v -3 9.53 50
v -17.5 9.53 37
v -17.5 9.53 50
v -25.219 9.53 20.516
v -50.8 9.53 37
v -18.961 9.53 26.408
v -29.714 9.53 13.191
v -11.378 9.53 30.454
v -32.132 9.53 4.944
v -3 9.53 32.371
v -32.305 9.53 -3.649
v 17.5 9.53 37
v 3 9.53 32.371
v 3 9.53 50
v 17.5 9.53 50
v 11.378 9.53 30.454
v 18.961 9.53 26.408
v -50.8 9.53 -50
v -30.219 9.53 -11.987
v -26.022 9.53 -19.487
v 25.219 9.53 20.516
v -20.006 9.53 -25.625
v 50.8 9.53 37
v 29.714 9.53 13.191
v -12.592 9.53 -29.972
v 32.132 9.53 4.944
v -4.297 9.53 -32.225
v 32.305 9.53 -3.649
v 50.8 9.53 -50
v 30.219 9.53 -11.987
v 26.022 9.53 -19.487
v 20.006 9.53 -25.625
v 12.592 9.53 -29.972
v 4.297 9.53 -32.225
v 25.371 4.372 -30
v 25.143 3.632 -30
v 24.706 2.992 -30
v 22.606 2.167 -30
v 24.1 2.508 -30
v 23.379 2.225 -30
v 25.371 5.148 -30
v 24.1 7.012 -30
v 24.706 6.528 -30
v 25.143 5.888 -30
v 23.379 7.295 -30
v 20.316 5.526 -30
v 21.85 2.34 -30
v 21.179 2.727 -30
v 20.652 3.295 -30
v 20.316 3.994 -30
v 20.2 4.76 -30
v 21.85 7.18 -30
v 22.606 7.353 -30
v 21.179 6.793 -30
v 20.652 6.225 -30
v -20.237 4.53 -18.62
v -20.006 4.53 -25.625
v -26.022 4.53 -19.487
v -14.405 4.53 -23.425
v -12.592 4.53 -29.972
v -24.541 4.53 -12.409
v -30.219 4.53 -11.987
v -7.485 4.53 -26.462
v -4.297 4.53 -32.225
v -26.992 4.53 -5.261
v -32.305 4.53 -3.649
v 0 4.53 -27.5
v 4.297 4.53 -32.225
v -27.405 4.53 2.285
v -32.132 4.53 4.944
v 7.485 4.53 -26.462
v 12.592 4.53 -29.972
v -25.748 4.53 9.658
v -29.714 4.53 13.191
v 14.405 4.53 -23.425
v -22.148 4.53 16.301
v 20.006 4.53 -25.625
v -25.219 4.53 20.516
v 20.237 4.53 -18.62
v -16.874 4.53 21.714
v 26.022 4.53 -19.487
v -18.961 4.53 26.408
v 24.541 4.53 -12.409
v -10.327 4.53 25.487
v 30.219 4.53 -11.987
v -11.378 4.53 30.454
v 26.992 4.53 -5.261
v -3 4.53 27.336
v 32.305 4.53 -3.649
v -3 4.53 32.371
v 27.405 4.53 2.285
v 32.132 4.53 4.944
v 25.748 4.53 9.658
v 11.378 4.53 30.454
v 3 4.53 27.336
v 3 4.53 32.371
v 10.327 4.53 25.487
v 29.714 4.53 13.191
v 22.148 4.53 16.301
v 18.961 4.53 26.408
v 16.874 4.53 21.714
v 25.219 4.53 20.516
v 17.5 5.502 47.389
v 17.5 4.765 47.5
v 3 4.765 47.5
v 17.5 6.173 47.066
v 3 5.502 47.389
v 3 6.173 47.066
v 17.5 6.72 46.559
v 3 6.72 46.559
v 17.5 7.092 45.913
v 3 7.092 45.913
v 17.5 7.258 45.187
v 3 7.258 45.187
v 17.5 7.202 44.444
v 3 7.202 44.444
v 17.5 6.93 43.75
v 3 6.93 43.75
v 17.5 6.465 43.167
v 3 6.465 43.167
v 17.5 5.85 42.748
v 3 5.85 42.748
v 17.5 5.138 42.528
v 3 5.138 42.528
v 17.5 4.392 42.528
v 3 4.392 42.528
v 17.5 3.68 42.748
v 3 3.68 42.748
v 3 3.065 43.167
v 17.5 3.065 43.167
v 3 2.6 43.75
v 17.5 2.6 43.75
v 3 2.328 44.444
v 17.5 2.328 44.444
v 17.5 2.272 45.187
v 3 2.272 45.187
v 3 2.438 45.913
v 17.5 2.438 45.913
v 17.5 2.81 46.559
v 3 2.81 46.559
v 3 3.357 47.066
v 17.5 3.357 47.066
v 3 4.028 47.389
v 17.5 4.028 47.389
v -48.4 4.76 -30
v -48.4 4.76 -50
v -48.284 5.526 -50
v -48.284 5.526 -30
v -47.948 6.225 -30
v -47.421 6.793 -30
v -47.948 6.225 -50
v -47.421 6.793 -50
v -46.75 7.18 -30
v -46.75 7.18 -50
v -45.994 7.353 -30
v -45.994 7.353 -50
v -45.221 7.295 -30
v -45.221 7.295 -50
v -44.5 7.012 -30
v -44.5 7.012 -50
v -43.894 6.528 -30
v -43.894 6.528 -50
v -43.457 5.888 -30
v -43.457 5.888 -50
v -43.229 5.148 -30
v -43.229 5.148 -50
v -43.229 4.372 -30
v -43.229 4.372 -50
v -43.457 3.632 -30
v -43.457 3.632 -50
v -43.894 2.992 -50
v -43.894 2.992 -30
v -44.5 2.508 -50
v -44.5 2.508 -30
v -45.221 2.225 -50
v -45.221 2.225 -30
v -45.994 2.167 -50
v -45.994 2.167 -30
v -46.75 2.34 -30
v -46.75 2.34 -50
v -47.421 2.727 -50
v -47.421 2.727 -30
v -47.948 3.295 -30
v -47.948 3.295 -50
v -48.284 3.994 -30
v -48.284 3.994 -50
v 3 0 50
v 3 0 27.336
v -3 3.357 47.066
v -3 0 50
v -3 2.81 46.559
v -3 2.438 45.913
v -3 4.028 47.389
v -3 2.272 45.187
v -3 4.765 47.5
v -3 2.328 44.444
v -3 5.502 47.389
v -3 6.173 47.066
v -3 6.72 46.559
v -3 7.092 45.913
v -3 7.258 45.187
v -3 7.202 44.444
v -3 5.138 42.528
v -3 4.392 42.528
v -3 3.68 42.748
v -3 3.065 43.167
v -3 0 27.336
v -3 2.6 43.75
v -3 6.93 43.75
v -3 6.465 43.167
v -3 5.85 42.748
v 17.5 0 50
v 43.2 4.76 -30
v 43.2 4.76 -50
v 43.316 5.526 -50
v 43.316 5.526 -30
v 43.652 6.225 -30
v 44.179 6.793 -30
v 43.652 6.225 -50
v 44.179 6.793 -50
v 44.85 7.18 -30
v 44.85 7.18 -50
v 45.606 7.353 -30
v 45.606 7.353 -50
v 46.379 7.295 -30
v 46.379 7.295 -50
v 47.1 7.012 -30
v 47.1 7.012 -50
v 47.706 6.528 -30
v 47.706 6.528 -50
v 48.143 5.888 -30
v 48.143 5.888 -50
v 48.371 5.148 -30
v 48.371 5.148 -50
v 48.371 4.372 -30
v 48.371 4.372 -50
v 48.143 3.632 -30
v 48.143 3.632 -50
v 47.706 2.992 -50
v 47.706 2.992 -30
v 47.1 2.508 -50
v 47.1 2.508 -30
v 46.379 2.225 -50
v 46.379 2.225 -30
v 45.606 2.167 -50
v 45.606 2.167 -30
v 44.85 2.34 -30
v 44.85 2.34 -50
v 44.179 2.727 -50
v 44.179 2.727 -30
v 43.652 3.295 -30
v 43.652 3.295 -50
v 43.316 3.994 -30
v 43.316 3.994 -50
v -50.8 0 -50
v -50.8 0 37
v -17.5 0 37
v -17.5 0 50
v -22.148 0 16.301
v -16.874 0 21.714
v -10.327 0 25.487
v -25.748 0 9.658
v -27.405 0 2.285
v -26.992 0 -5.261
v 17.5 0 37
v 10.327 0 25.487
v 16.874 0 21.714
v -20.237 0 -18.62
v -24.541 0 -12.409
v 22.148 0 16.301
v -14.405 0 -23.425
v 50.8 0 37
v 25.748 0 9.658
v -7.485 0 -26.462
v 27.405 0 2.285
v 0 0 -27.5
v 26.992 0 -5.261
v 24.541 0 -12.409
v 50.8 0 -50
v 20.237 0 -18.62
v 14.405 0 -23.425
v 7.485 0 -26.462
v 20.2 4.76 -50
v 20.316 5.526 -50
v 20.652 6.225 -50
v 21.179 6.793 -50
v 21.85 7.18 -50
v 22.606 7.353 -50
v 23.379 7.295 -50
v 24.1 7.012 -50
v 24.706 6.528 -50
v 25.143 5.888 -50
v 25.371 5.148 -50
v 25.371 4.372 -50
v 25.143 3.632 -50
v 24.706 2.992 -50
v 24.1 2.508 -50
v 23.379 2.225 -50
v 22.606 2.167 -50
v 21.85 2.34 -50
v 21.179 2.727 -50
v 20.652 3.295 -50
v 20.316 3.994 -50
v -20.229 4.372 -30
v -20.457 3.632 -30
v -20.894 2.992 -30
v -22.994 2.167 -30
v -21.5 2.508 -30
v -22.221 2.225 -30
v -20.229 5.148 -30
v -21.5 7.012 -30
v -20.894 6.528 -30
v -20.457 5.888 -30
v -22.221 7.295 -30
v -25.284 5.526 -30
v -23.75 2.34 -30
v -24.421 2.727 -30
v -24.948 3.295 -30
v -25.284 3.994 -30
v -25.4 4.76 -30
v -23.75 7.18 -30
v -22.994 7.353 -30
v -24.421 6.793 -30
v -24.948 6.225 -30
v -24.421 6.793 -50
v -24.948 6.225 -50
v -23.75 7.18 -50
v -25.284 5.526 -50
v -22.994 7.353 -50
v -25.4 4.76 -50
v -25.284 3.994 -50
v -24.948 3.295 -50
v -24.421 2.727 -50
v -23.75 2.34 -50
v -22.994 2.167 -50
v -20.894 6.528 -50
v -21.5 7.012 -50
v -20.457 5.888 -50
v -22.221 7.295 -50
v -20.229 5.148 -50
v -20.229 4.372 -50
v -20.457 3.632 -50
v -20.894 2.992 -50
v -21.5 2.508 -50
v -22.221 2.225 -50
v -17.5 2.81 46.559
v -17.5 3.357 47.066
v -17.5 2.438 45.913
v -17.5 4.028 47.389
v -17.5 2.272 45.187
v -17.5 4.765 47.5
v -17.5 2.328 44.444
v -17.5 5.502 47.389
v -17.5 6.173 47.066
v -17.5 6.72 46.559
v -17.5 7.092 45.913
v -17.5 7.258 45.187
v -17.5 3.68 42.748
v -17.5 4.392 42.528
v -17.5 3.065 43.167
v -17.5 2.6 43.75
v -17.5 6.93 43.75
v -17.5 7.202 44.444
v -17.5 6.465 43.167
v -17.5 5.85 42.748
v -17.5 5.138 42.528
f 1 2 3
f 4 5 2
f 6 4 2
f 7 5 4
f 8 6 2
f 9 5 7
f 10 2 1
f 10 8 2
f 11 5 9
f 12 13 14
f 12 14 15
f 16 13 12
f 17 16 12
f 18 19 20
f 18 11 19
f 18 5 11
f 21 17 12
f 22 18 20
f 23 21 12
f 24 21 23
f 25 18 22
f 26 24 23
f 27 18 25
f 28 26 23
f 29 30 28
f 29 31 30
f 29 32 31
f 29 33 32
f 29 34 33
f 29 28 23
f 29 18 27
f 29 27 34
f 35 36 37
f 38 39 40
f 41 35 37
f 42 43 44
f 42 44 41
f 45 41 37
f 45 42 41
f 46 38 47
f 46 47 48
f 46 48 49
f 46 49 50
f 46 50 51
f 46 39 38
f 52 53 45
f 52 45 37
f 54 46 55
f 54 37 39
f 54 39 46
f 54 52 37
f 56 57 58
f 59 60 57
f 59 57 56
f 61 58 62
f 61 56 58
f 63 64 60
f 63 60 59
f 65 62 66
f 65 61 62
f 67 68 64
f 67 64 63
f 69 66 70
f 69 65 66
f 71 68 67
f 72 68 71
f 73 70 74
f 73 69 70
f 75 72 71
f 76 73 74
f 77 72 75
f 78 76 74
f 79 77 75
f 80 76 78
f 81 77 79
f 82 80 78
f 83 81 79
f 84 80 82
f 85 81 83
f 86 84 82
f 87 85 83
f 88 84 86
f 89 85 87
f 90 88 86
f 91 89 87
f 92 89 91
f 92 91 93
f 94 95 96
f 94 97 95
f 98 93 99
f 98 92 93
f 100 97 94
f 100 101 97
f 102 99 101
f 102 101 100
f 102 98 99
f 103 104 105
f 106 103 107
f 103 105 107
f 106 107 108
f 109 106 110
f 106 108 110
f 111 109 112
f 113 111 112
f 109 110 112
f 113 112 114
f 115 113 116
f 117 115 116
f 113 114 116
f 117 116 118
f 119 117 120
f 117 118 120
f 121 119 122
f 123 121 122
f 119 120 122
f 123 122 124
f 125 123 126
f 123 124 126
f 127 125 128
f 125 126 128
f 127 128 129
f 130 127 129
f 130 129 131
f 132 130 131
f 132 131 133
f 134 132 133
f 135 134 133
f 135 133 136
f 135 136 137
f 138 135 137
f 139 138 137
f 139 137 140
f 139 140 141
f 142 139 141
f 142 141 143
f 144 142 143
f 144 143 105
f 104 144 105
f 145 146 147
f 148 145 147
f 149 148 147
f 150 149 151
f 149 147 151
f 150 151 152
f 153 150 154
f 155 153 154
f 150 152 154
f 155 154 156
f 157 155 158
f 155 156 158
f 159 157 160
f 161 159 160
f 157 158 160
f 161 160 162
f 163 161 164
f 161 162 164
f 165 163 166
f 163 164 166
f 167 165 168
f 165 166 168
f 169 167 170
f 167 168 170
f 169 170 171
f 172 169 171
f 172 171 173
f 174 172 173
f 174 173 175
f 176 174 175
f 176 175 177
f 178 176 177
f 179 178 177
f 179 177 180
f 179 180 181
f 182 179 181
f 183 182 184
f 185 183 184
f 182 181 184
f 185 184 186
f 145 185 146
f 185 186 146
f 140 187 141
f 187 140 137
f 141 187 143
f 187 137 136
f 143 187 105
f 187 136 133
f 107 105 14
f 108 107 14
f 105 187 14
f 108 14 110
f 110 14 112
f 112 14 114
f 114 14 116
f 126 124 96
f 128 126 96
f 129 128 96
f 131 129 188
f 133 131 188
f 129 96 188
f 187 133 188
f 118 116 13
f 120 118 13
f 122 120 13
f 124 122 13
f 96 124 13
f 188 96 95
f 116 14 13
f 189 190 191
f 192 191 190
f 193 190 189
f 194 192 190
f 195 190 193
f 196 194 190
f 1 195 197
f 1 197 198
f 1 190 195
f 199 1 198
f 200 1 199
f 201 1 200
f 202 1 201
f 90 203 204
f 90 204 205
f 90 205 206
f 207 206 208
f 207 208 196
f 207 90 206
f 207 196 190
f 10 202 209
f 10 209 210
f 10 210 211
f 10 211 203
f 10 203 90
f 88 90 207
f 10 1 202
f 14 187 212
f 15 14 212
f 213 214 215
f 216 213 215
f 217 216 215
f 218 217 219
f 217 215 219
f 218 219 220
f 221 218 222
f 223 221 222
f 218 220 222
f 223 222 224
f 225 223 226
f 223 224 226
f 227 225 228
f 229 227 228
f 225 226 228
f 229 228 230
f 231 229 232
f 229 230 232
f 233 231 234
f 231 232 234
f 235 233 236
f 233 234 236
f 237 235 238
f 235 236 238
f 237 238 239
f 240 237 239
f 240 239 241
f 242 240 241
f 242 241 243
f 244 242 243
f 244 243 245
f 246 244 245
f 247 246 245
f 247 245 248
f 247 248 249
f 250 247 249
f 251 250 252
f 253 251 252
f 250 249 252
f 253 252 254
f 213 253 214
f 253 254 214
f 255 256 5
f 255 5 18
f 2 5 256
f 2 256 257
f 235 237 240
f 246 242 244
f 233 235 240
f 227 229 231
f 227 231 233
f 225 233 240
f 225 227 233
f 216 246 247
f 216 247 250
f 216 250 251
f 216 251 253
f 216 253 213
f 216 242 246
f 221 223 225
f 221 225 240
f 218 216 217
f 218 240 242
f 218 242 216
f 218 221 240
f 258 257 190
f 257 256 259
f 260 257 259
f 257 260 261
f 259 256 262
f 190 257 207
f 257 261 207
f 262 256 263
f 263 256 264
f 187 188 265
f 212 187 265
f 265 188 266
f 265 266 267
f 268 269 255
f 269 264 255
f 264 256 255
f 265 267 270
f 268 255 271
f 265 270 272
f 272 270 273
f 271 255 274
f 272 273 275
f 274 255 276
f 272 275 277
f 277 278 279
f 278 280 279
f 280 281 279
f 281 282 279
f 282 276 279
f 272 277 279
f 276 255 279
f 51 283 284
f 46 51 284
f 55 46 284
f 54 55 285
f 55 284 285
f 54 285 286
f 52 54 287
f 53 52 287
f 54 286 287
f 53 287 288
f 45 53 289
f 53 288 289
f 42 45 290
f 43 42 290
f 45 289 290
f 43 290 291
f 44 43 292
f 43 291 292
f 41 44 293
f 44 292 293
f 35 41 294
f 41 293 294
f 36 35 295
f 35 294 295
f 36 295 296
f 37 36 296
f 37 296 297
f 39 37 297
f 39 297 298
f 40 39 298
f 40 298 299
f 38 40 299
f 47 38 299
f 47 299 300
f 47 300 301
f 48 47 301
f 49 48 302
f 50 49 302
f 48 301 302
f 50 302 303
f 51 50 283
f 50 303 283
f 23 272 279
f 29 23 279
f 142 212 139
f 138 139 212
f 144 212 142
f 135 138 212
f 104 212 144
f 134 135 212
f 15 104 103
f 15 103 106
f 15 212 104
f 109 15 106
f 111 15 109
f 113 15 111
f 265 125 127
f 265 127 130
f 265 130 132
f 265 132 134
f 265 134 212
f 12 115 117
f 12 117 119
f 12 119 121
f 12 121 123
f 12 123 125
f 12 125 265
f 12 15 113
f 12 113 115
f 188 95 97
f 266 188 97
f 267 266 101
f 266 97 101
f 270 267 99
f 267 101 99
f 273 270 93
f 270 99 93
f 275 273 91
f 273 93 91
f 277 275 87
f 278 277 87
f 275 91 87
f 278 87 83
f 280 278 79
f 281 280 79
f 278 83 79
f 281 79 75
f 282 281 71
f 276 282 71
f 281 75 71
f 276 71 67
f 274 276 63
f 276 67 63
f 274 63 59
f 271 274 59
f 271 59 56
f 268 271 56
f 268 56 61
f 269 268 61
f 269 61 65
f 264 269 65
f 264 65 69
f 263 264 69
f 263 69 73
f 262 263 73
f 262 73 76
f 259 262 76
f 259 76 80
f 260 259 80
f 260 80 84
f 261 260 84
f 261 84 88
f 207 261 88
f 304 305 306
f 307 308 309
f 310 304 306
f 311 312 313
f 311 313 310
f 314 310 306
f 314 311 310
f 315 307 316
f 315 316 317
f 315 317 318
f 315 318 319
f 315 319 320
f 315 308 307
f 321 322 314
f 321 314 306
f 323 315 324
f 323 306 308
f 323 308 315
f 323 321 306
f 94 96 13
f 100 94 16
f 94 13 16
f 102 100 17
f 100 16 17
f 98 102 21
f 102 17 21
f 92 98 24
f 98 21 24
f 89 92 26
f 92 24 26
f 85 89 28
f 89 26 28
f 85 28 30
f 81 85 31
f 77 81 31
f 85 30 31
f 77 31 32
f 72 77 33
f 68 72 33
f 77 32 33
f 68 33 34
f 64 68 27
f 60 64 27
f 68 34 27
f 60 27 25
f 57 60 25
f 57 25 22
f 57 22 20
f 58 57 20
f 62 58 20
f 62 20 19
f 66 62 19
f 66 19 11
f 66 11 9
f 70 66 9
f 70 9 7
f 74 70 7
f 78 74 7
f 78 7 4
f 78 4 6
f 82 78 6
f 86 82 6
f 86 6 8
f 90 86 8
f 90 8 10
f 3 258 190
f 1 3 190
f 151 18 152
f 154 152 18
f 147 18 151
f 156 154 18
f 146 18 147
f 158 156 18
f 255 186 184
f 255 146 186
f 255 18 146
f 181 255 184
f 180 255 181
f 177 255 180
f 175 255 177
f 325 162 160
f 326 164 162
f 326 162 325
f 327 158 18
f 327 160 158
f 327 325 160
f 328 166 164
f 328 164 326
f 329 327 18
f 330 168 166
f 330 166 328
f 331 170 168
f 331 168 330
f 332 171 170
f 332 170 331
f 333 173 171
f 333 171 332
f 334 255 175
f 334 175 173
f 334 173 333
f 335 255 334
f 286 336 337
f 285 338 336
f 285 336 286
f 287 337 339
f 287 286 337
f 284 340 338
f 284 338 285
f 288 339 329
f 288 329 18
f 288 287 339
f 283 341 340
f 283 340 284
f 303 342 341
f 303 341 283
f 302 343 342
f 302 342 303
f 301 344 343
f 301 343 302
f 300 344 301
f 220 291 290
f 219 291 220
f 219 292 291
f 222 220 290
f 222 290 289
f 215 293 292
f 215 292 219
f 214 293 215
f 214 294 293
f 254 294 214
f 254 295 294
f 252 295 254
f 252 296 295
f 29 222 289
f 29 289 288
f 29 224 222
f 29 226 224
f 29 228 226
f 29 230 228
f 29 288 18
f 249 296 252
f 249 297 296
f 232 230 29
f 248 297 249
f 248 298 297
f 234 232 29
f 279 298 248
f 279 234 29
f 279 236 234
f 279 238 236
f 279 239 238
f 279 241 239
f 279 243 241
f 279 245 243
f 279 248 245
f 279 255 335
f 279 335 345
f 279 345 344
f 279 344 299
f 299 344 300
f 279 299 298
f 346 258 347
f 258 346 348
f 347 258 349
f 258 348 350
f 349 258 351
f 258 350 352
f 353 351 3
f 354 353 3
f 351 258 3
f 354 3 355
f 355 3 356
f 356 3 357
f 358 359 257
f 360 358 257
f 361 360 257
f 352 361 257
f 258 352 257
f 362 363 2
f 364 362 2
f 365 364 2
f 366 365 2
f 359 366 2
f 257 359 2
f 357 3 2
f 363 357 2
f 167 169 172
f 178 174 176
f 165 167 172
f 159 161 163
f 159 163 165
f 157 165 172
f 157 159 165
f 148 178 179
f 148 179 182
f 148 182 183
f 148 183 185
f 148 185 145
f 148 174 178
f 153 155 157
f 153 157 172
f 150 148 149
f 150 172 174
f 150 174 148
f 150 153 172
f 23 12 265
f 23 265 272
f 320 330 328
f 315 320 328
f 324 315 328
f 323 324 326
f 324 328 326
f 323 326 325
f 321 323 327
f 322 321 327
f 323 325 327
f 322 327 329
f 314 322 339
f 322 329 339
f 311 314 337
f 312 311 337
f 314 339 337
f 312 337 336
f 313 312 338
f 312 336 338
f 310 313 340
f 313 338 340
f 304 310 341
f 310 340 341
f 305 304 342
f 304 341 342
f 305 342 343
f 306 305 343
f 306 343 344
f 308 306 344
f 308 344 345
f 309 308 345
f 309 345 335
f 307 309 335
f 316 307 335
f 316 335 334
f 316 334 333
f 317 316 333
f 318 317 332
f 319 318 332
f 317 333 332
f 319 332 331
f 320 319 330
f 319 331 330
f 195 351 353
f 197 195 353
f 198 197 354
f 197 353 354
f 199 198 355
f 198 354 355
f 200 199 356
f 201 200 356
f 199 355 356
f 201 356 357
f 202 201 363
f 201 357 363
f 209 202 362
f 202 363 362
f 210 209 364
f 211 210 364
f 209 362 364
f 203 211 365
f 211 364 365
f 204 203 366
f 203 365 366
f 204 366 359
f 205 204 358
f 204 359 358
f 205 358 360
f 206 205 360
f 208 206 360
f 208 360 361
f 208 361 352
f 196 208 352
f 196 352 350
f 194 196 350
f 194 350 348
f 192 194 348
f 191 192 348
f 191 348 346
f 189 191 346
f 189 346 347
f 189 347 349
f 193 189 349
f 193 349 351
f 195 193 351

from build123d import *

# Parameters (mm, degrees)
ESBO_O1_W                = 101.6
ESBO_O1_H                = 100
RESSALTO_EXTRUS_O1_DEPTH = 9.53
ESBO_O2_R                = 2.6
CORTE_EXTRUS_O1_DEPTH    = 20
ESBO_O3_R                = 32.51
CORTE_EXTRUS_O2_DEPTH    = 5
CORTE_EXTRUS_O3_REACH    = 73.454
ESBO_O4_R                = 27.5
CORTE_EXTRUS_O4_REACH    = 73.913
ESBO_O5_W                = 33.3
ESBO_O5_H                = 13
CORTE_EXTRUS_O5_REACH    = 73.913
ESBO_O6_W                = 6
ESBO_O6_H                = 29.667415493
CORTE_EXTRUS_O6_REACH    = 87.18
ESBO_O7_R                = 2.5


with BuildPart() as part:
    # Esboço1 → Ressalto-extrusão1 (new body)
    with BuildSketch(Plane(origin=(0, 0, 0), x_dir=(1, 0, 0), z_dir=(0, 1, 0))):
        Rectangle(ESBO_O1_W, ESBO_O1_H)
    extrude(amount=RESSALTO_EXTRUS_O1_DEPTH)

    # Esboço2 → Corte-extrusão1 (cut)
    with BuildSketch(Plane(origin=(0, 0, -50), x_dir=(-1, 0, 0), z_dir=(0, 0, -1))):
        with Locations((-45.8, 4.76)):
            Circle(ESBO_O2_R)
        with Locations((-22.8, 4.76)):
            Circle(ESBO_O2_R)
        with Locations((22.8, 4.76)):
            Circle(ESBO_O2_R)
        with Locations((45.8, 4.76)):
            Circle(ESBO_O2_R)
    extrude(amount=-CORTE_EXTRUS_O1_DEPTH, mode=Mode.SUBTRACT)

    # Esboço3 → Corte-extrusão2 (cut)
    with BuildSketch(Plane(origin=(0, 9.53, 0), x_dir=(1, 0, 0), z_dir=(0, 1, 0))):
        with Locations(Location((0, 0, 0), (0, 0, 270))):
            Circle(ESBO_O3_R)
    extrude(amount=-CORTE_EXTRUS_O2_DEPTH, mode=Mode.SUBTRACT)

    # Esboço4 → Corte-extrusão3 (cut, up to next)
    with BuildSketch(Plane(origin=(0, 4.53, 0), x_dir=(1, 0, 0), z_dir=(0, 1, 0)), mode=Mode.PRIVATE) as corte_extrus_o3_sk1:
        with Locations(Location((0, 0, 0), (0, 0, 270))):
            Circle(ESBO_O4_R)
    corte_extrus_o3_tool1 = extrude(corte_extrus_o3_sk1.sketch, amount=-CORTE_EXTRUS_O3_REACH, mode=Mode.PRIVATE) & part.part
    add(corte_extrus_o3_tool1.solids().sort_by_distance((0, 4.53, 0))[0], mode=Mode.SUBTRACT)

    # Esboço5 → Corte-extrusão4 (cut, up to next)
    with BuildSketch(Plane(origin=(0, 9.53, 0), x_dir=(1, 0, 0), z_dir=(0, 1, 0)), mode=Mode.PRIVATE) as corte_extrus_o4_sk1:
        with Locations((34.15, -43.5)):
            Rectangle(ESBO_O5_W, ESBO_O5_H)
    corte_extrus_o4_tool1 = extrude(corte_extrus_o4_sk1.sketch, amount=-CORTE_EXTRUS_O4_REACH, mode=Mode.PRIVATE) & part.part
    # Esboço5 → Corte-extrusão4 (cut, up to next)
    with BuildSketch(Plane(origin=(0, 9.53, 0), x_dir=(1, 0, 0), z_dir=(0, 1, 0)), mode=Mode.PRIVATE) as corte_extrus_o4_sk2:
        with Locations((-34.15, -43.5)):
            Rectangle(ESBO_O5_W, ESBO_O5_H)
    corte_extrus_o4_tool2 = extrude(corte_extrus_o4_sk2.sketch, amount=-CORTE_EXTRUS_O4_REACH, mode=Mode.PRIVATE) & part.part
    add(corte_extrus_o4_tool1.solids().sort_by_distance((34.15, 9.53, 43.5))[0], mode=Mode.SUBTRACT)
    add(corte_extrus_o4_tool2.solids().sort_by_distance((-34.15, 9.53, 43.5))[0], mode=Mode.SUBTRACT)

    # Esboço6 → Corte-extrusão5 (cut, up to next)
    with BuildSketch(Plane(origin=(0, 9.53, 0), x_dir=(1, 0, 0), z_dir=(0, 1, 0)), mode=Mode.PRIVATE) as corte_extrus_o5_sk1:
        with Locations((0, -35.166292254)):
            Rectangle(ESBO_O6_W, ESBO_O6_H)
    corte_extrus_o5_tool1 = extrude(corte_extrus_o5_sk1.sketch, amount=-CORTE_EXTRUS_O5_REACH, mode=Mode.PRIVATE) & part.part
    add(corte_extrus_o5_tool1.solids().sort_by_distance((0, 9.53, 35.166292))[0], mode=Mode.SUBTRACT)

    # Corte-extrusão6: up to this face of the body (flat: up to its plane)
    corte_extrus_o6_end = Plane(part.part.faces().sort_by_distance((17.5, 4.765, 43.5))[0])
    # Esboço7 → Corte-extrusão6 (cut, up to the picked face)
    with BuildSketch(Plane.ZY.offset(17.5), mode=Mode.PRIVATE) as corte_extrus_o6_sk1:
        with Locations((45, 4.765)):
            Circle(ESBO_O7_R)
    corte_extrus_o6_tool1 = split(extrude(corte_extrus_o6_sk1.sketch, amount=-CORTE_EXTRUS_O6_REACH, mode=Mode.PRIVATE), bisect_by=corte_extrus_o6_end, keep=Keep.BOTH, mode=Mode.PRIVATE)
    add(corte_extrus_o6_tool1.solids().sort_by(Axis((-17.5, 4.765, 45), (1, 0, 0)))[0], mode=Mode.SUBTRACT)


solid = part.part
